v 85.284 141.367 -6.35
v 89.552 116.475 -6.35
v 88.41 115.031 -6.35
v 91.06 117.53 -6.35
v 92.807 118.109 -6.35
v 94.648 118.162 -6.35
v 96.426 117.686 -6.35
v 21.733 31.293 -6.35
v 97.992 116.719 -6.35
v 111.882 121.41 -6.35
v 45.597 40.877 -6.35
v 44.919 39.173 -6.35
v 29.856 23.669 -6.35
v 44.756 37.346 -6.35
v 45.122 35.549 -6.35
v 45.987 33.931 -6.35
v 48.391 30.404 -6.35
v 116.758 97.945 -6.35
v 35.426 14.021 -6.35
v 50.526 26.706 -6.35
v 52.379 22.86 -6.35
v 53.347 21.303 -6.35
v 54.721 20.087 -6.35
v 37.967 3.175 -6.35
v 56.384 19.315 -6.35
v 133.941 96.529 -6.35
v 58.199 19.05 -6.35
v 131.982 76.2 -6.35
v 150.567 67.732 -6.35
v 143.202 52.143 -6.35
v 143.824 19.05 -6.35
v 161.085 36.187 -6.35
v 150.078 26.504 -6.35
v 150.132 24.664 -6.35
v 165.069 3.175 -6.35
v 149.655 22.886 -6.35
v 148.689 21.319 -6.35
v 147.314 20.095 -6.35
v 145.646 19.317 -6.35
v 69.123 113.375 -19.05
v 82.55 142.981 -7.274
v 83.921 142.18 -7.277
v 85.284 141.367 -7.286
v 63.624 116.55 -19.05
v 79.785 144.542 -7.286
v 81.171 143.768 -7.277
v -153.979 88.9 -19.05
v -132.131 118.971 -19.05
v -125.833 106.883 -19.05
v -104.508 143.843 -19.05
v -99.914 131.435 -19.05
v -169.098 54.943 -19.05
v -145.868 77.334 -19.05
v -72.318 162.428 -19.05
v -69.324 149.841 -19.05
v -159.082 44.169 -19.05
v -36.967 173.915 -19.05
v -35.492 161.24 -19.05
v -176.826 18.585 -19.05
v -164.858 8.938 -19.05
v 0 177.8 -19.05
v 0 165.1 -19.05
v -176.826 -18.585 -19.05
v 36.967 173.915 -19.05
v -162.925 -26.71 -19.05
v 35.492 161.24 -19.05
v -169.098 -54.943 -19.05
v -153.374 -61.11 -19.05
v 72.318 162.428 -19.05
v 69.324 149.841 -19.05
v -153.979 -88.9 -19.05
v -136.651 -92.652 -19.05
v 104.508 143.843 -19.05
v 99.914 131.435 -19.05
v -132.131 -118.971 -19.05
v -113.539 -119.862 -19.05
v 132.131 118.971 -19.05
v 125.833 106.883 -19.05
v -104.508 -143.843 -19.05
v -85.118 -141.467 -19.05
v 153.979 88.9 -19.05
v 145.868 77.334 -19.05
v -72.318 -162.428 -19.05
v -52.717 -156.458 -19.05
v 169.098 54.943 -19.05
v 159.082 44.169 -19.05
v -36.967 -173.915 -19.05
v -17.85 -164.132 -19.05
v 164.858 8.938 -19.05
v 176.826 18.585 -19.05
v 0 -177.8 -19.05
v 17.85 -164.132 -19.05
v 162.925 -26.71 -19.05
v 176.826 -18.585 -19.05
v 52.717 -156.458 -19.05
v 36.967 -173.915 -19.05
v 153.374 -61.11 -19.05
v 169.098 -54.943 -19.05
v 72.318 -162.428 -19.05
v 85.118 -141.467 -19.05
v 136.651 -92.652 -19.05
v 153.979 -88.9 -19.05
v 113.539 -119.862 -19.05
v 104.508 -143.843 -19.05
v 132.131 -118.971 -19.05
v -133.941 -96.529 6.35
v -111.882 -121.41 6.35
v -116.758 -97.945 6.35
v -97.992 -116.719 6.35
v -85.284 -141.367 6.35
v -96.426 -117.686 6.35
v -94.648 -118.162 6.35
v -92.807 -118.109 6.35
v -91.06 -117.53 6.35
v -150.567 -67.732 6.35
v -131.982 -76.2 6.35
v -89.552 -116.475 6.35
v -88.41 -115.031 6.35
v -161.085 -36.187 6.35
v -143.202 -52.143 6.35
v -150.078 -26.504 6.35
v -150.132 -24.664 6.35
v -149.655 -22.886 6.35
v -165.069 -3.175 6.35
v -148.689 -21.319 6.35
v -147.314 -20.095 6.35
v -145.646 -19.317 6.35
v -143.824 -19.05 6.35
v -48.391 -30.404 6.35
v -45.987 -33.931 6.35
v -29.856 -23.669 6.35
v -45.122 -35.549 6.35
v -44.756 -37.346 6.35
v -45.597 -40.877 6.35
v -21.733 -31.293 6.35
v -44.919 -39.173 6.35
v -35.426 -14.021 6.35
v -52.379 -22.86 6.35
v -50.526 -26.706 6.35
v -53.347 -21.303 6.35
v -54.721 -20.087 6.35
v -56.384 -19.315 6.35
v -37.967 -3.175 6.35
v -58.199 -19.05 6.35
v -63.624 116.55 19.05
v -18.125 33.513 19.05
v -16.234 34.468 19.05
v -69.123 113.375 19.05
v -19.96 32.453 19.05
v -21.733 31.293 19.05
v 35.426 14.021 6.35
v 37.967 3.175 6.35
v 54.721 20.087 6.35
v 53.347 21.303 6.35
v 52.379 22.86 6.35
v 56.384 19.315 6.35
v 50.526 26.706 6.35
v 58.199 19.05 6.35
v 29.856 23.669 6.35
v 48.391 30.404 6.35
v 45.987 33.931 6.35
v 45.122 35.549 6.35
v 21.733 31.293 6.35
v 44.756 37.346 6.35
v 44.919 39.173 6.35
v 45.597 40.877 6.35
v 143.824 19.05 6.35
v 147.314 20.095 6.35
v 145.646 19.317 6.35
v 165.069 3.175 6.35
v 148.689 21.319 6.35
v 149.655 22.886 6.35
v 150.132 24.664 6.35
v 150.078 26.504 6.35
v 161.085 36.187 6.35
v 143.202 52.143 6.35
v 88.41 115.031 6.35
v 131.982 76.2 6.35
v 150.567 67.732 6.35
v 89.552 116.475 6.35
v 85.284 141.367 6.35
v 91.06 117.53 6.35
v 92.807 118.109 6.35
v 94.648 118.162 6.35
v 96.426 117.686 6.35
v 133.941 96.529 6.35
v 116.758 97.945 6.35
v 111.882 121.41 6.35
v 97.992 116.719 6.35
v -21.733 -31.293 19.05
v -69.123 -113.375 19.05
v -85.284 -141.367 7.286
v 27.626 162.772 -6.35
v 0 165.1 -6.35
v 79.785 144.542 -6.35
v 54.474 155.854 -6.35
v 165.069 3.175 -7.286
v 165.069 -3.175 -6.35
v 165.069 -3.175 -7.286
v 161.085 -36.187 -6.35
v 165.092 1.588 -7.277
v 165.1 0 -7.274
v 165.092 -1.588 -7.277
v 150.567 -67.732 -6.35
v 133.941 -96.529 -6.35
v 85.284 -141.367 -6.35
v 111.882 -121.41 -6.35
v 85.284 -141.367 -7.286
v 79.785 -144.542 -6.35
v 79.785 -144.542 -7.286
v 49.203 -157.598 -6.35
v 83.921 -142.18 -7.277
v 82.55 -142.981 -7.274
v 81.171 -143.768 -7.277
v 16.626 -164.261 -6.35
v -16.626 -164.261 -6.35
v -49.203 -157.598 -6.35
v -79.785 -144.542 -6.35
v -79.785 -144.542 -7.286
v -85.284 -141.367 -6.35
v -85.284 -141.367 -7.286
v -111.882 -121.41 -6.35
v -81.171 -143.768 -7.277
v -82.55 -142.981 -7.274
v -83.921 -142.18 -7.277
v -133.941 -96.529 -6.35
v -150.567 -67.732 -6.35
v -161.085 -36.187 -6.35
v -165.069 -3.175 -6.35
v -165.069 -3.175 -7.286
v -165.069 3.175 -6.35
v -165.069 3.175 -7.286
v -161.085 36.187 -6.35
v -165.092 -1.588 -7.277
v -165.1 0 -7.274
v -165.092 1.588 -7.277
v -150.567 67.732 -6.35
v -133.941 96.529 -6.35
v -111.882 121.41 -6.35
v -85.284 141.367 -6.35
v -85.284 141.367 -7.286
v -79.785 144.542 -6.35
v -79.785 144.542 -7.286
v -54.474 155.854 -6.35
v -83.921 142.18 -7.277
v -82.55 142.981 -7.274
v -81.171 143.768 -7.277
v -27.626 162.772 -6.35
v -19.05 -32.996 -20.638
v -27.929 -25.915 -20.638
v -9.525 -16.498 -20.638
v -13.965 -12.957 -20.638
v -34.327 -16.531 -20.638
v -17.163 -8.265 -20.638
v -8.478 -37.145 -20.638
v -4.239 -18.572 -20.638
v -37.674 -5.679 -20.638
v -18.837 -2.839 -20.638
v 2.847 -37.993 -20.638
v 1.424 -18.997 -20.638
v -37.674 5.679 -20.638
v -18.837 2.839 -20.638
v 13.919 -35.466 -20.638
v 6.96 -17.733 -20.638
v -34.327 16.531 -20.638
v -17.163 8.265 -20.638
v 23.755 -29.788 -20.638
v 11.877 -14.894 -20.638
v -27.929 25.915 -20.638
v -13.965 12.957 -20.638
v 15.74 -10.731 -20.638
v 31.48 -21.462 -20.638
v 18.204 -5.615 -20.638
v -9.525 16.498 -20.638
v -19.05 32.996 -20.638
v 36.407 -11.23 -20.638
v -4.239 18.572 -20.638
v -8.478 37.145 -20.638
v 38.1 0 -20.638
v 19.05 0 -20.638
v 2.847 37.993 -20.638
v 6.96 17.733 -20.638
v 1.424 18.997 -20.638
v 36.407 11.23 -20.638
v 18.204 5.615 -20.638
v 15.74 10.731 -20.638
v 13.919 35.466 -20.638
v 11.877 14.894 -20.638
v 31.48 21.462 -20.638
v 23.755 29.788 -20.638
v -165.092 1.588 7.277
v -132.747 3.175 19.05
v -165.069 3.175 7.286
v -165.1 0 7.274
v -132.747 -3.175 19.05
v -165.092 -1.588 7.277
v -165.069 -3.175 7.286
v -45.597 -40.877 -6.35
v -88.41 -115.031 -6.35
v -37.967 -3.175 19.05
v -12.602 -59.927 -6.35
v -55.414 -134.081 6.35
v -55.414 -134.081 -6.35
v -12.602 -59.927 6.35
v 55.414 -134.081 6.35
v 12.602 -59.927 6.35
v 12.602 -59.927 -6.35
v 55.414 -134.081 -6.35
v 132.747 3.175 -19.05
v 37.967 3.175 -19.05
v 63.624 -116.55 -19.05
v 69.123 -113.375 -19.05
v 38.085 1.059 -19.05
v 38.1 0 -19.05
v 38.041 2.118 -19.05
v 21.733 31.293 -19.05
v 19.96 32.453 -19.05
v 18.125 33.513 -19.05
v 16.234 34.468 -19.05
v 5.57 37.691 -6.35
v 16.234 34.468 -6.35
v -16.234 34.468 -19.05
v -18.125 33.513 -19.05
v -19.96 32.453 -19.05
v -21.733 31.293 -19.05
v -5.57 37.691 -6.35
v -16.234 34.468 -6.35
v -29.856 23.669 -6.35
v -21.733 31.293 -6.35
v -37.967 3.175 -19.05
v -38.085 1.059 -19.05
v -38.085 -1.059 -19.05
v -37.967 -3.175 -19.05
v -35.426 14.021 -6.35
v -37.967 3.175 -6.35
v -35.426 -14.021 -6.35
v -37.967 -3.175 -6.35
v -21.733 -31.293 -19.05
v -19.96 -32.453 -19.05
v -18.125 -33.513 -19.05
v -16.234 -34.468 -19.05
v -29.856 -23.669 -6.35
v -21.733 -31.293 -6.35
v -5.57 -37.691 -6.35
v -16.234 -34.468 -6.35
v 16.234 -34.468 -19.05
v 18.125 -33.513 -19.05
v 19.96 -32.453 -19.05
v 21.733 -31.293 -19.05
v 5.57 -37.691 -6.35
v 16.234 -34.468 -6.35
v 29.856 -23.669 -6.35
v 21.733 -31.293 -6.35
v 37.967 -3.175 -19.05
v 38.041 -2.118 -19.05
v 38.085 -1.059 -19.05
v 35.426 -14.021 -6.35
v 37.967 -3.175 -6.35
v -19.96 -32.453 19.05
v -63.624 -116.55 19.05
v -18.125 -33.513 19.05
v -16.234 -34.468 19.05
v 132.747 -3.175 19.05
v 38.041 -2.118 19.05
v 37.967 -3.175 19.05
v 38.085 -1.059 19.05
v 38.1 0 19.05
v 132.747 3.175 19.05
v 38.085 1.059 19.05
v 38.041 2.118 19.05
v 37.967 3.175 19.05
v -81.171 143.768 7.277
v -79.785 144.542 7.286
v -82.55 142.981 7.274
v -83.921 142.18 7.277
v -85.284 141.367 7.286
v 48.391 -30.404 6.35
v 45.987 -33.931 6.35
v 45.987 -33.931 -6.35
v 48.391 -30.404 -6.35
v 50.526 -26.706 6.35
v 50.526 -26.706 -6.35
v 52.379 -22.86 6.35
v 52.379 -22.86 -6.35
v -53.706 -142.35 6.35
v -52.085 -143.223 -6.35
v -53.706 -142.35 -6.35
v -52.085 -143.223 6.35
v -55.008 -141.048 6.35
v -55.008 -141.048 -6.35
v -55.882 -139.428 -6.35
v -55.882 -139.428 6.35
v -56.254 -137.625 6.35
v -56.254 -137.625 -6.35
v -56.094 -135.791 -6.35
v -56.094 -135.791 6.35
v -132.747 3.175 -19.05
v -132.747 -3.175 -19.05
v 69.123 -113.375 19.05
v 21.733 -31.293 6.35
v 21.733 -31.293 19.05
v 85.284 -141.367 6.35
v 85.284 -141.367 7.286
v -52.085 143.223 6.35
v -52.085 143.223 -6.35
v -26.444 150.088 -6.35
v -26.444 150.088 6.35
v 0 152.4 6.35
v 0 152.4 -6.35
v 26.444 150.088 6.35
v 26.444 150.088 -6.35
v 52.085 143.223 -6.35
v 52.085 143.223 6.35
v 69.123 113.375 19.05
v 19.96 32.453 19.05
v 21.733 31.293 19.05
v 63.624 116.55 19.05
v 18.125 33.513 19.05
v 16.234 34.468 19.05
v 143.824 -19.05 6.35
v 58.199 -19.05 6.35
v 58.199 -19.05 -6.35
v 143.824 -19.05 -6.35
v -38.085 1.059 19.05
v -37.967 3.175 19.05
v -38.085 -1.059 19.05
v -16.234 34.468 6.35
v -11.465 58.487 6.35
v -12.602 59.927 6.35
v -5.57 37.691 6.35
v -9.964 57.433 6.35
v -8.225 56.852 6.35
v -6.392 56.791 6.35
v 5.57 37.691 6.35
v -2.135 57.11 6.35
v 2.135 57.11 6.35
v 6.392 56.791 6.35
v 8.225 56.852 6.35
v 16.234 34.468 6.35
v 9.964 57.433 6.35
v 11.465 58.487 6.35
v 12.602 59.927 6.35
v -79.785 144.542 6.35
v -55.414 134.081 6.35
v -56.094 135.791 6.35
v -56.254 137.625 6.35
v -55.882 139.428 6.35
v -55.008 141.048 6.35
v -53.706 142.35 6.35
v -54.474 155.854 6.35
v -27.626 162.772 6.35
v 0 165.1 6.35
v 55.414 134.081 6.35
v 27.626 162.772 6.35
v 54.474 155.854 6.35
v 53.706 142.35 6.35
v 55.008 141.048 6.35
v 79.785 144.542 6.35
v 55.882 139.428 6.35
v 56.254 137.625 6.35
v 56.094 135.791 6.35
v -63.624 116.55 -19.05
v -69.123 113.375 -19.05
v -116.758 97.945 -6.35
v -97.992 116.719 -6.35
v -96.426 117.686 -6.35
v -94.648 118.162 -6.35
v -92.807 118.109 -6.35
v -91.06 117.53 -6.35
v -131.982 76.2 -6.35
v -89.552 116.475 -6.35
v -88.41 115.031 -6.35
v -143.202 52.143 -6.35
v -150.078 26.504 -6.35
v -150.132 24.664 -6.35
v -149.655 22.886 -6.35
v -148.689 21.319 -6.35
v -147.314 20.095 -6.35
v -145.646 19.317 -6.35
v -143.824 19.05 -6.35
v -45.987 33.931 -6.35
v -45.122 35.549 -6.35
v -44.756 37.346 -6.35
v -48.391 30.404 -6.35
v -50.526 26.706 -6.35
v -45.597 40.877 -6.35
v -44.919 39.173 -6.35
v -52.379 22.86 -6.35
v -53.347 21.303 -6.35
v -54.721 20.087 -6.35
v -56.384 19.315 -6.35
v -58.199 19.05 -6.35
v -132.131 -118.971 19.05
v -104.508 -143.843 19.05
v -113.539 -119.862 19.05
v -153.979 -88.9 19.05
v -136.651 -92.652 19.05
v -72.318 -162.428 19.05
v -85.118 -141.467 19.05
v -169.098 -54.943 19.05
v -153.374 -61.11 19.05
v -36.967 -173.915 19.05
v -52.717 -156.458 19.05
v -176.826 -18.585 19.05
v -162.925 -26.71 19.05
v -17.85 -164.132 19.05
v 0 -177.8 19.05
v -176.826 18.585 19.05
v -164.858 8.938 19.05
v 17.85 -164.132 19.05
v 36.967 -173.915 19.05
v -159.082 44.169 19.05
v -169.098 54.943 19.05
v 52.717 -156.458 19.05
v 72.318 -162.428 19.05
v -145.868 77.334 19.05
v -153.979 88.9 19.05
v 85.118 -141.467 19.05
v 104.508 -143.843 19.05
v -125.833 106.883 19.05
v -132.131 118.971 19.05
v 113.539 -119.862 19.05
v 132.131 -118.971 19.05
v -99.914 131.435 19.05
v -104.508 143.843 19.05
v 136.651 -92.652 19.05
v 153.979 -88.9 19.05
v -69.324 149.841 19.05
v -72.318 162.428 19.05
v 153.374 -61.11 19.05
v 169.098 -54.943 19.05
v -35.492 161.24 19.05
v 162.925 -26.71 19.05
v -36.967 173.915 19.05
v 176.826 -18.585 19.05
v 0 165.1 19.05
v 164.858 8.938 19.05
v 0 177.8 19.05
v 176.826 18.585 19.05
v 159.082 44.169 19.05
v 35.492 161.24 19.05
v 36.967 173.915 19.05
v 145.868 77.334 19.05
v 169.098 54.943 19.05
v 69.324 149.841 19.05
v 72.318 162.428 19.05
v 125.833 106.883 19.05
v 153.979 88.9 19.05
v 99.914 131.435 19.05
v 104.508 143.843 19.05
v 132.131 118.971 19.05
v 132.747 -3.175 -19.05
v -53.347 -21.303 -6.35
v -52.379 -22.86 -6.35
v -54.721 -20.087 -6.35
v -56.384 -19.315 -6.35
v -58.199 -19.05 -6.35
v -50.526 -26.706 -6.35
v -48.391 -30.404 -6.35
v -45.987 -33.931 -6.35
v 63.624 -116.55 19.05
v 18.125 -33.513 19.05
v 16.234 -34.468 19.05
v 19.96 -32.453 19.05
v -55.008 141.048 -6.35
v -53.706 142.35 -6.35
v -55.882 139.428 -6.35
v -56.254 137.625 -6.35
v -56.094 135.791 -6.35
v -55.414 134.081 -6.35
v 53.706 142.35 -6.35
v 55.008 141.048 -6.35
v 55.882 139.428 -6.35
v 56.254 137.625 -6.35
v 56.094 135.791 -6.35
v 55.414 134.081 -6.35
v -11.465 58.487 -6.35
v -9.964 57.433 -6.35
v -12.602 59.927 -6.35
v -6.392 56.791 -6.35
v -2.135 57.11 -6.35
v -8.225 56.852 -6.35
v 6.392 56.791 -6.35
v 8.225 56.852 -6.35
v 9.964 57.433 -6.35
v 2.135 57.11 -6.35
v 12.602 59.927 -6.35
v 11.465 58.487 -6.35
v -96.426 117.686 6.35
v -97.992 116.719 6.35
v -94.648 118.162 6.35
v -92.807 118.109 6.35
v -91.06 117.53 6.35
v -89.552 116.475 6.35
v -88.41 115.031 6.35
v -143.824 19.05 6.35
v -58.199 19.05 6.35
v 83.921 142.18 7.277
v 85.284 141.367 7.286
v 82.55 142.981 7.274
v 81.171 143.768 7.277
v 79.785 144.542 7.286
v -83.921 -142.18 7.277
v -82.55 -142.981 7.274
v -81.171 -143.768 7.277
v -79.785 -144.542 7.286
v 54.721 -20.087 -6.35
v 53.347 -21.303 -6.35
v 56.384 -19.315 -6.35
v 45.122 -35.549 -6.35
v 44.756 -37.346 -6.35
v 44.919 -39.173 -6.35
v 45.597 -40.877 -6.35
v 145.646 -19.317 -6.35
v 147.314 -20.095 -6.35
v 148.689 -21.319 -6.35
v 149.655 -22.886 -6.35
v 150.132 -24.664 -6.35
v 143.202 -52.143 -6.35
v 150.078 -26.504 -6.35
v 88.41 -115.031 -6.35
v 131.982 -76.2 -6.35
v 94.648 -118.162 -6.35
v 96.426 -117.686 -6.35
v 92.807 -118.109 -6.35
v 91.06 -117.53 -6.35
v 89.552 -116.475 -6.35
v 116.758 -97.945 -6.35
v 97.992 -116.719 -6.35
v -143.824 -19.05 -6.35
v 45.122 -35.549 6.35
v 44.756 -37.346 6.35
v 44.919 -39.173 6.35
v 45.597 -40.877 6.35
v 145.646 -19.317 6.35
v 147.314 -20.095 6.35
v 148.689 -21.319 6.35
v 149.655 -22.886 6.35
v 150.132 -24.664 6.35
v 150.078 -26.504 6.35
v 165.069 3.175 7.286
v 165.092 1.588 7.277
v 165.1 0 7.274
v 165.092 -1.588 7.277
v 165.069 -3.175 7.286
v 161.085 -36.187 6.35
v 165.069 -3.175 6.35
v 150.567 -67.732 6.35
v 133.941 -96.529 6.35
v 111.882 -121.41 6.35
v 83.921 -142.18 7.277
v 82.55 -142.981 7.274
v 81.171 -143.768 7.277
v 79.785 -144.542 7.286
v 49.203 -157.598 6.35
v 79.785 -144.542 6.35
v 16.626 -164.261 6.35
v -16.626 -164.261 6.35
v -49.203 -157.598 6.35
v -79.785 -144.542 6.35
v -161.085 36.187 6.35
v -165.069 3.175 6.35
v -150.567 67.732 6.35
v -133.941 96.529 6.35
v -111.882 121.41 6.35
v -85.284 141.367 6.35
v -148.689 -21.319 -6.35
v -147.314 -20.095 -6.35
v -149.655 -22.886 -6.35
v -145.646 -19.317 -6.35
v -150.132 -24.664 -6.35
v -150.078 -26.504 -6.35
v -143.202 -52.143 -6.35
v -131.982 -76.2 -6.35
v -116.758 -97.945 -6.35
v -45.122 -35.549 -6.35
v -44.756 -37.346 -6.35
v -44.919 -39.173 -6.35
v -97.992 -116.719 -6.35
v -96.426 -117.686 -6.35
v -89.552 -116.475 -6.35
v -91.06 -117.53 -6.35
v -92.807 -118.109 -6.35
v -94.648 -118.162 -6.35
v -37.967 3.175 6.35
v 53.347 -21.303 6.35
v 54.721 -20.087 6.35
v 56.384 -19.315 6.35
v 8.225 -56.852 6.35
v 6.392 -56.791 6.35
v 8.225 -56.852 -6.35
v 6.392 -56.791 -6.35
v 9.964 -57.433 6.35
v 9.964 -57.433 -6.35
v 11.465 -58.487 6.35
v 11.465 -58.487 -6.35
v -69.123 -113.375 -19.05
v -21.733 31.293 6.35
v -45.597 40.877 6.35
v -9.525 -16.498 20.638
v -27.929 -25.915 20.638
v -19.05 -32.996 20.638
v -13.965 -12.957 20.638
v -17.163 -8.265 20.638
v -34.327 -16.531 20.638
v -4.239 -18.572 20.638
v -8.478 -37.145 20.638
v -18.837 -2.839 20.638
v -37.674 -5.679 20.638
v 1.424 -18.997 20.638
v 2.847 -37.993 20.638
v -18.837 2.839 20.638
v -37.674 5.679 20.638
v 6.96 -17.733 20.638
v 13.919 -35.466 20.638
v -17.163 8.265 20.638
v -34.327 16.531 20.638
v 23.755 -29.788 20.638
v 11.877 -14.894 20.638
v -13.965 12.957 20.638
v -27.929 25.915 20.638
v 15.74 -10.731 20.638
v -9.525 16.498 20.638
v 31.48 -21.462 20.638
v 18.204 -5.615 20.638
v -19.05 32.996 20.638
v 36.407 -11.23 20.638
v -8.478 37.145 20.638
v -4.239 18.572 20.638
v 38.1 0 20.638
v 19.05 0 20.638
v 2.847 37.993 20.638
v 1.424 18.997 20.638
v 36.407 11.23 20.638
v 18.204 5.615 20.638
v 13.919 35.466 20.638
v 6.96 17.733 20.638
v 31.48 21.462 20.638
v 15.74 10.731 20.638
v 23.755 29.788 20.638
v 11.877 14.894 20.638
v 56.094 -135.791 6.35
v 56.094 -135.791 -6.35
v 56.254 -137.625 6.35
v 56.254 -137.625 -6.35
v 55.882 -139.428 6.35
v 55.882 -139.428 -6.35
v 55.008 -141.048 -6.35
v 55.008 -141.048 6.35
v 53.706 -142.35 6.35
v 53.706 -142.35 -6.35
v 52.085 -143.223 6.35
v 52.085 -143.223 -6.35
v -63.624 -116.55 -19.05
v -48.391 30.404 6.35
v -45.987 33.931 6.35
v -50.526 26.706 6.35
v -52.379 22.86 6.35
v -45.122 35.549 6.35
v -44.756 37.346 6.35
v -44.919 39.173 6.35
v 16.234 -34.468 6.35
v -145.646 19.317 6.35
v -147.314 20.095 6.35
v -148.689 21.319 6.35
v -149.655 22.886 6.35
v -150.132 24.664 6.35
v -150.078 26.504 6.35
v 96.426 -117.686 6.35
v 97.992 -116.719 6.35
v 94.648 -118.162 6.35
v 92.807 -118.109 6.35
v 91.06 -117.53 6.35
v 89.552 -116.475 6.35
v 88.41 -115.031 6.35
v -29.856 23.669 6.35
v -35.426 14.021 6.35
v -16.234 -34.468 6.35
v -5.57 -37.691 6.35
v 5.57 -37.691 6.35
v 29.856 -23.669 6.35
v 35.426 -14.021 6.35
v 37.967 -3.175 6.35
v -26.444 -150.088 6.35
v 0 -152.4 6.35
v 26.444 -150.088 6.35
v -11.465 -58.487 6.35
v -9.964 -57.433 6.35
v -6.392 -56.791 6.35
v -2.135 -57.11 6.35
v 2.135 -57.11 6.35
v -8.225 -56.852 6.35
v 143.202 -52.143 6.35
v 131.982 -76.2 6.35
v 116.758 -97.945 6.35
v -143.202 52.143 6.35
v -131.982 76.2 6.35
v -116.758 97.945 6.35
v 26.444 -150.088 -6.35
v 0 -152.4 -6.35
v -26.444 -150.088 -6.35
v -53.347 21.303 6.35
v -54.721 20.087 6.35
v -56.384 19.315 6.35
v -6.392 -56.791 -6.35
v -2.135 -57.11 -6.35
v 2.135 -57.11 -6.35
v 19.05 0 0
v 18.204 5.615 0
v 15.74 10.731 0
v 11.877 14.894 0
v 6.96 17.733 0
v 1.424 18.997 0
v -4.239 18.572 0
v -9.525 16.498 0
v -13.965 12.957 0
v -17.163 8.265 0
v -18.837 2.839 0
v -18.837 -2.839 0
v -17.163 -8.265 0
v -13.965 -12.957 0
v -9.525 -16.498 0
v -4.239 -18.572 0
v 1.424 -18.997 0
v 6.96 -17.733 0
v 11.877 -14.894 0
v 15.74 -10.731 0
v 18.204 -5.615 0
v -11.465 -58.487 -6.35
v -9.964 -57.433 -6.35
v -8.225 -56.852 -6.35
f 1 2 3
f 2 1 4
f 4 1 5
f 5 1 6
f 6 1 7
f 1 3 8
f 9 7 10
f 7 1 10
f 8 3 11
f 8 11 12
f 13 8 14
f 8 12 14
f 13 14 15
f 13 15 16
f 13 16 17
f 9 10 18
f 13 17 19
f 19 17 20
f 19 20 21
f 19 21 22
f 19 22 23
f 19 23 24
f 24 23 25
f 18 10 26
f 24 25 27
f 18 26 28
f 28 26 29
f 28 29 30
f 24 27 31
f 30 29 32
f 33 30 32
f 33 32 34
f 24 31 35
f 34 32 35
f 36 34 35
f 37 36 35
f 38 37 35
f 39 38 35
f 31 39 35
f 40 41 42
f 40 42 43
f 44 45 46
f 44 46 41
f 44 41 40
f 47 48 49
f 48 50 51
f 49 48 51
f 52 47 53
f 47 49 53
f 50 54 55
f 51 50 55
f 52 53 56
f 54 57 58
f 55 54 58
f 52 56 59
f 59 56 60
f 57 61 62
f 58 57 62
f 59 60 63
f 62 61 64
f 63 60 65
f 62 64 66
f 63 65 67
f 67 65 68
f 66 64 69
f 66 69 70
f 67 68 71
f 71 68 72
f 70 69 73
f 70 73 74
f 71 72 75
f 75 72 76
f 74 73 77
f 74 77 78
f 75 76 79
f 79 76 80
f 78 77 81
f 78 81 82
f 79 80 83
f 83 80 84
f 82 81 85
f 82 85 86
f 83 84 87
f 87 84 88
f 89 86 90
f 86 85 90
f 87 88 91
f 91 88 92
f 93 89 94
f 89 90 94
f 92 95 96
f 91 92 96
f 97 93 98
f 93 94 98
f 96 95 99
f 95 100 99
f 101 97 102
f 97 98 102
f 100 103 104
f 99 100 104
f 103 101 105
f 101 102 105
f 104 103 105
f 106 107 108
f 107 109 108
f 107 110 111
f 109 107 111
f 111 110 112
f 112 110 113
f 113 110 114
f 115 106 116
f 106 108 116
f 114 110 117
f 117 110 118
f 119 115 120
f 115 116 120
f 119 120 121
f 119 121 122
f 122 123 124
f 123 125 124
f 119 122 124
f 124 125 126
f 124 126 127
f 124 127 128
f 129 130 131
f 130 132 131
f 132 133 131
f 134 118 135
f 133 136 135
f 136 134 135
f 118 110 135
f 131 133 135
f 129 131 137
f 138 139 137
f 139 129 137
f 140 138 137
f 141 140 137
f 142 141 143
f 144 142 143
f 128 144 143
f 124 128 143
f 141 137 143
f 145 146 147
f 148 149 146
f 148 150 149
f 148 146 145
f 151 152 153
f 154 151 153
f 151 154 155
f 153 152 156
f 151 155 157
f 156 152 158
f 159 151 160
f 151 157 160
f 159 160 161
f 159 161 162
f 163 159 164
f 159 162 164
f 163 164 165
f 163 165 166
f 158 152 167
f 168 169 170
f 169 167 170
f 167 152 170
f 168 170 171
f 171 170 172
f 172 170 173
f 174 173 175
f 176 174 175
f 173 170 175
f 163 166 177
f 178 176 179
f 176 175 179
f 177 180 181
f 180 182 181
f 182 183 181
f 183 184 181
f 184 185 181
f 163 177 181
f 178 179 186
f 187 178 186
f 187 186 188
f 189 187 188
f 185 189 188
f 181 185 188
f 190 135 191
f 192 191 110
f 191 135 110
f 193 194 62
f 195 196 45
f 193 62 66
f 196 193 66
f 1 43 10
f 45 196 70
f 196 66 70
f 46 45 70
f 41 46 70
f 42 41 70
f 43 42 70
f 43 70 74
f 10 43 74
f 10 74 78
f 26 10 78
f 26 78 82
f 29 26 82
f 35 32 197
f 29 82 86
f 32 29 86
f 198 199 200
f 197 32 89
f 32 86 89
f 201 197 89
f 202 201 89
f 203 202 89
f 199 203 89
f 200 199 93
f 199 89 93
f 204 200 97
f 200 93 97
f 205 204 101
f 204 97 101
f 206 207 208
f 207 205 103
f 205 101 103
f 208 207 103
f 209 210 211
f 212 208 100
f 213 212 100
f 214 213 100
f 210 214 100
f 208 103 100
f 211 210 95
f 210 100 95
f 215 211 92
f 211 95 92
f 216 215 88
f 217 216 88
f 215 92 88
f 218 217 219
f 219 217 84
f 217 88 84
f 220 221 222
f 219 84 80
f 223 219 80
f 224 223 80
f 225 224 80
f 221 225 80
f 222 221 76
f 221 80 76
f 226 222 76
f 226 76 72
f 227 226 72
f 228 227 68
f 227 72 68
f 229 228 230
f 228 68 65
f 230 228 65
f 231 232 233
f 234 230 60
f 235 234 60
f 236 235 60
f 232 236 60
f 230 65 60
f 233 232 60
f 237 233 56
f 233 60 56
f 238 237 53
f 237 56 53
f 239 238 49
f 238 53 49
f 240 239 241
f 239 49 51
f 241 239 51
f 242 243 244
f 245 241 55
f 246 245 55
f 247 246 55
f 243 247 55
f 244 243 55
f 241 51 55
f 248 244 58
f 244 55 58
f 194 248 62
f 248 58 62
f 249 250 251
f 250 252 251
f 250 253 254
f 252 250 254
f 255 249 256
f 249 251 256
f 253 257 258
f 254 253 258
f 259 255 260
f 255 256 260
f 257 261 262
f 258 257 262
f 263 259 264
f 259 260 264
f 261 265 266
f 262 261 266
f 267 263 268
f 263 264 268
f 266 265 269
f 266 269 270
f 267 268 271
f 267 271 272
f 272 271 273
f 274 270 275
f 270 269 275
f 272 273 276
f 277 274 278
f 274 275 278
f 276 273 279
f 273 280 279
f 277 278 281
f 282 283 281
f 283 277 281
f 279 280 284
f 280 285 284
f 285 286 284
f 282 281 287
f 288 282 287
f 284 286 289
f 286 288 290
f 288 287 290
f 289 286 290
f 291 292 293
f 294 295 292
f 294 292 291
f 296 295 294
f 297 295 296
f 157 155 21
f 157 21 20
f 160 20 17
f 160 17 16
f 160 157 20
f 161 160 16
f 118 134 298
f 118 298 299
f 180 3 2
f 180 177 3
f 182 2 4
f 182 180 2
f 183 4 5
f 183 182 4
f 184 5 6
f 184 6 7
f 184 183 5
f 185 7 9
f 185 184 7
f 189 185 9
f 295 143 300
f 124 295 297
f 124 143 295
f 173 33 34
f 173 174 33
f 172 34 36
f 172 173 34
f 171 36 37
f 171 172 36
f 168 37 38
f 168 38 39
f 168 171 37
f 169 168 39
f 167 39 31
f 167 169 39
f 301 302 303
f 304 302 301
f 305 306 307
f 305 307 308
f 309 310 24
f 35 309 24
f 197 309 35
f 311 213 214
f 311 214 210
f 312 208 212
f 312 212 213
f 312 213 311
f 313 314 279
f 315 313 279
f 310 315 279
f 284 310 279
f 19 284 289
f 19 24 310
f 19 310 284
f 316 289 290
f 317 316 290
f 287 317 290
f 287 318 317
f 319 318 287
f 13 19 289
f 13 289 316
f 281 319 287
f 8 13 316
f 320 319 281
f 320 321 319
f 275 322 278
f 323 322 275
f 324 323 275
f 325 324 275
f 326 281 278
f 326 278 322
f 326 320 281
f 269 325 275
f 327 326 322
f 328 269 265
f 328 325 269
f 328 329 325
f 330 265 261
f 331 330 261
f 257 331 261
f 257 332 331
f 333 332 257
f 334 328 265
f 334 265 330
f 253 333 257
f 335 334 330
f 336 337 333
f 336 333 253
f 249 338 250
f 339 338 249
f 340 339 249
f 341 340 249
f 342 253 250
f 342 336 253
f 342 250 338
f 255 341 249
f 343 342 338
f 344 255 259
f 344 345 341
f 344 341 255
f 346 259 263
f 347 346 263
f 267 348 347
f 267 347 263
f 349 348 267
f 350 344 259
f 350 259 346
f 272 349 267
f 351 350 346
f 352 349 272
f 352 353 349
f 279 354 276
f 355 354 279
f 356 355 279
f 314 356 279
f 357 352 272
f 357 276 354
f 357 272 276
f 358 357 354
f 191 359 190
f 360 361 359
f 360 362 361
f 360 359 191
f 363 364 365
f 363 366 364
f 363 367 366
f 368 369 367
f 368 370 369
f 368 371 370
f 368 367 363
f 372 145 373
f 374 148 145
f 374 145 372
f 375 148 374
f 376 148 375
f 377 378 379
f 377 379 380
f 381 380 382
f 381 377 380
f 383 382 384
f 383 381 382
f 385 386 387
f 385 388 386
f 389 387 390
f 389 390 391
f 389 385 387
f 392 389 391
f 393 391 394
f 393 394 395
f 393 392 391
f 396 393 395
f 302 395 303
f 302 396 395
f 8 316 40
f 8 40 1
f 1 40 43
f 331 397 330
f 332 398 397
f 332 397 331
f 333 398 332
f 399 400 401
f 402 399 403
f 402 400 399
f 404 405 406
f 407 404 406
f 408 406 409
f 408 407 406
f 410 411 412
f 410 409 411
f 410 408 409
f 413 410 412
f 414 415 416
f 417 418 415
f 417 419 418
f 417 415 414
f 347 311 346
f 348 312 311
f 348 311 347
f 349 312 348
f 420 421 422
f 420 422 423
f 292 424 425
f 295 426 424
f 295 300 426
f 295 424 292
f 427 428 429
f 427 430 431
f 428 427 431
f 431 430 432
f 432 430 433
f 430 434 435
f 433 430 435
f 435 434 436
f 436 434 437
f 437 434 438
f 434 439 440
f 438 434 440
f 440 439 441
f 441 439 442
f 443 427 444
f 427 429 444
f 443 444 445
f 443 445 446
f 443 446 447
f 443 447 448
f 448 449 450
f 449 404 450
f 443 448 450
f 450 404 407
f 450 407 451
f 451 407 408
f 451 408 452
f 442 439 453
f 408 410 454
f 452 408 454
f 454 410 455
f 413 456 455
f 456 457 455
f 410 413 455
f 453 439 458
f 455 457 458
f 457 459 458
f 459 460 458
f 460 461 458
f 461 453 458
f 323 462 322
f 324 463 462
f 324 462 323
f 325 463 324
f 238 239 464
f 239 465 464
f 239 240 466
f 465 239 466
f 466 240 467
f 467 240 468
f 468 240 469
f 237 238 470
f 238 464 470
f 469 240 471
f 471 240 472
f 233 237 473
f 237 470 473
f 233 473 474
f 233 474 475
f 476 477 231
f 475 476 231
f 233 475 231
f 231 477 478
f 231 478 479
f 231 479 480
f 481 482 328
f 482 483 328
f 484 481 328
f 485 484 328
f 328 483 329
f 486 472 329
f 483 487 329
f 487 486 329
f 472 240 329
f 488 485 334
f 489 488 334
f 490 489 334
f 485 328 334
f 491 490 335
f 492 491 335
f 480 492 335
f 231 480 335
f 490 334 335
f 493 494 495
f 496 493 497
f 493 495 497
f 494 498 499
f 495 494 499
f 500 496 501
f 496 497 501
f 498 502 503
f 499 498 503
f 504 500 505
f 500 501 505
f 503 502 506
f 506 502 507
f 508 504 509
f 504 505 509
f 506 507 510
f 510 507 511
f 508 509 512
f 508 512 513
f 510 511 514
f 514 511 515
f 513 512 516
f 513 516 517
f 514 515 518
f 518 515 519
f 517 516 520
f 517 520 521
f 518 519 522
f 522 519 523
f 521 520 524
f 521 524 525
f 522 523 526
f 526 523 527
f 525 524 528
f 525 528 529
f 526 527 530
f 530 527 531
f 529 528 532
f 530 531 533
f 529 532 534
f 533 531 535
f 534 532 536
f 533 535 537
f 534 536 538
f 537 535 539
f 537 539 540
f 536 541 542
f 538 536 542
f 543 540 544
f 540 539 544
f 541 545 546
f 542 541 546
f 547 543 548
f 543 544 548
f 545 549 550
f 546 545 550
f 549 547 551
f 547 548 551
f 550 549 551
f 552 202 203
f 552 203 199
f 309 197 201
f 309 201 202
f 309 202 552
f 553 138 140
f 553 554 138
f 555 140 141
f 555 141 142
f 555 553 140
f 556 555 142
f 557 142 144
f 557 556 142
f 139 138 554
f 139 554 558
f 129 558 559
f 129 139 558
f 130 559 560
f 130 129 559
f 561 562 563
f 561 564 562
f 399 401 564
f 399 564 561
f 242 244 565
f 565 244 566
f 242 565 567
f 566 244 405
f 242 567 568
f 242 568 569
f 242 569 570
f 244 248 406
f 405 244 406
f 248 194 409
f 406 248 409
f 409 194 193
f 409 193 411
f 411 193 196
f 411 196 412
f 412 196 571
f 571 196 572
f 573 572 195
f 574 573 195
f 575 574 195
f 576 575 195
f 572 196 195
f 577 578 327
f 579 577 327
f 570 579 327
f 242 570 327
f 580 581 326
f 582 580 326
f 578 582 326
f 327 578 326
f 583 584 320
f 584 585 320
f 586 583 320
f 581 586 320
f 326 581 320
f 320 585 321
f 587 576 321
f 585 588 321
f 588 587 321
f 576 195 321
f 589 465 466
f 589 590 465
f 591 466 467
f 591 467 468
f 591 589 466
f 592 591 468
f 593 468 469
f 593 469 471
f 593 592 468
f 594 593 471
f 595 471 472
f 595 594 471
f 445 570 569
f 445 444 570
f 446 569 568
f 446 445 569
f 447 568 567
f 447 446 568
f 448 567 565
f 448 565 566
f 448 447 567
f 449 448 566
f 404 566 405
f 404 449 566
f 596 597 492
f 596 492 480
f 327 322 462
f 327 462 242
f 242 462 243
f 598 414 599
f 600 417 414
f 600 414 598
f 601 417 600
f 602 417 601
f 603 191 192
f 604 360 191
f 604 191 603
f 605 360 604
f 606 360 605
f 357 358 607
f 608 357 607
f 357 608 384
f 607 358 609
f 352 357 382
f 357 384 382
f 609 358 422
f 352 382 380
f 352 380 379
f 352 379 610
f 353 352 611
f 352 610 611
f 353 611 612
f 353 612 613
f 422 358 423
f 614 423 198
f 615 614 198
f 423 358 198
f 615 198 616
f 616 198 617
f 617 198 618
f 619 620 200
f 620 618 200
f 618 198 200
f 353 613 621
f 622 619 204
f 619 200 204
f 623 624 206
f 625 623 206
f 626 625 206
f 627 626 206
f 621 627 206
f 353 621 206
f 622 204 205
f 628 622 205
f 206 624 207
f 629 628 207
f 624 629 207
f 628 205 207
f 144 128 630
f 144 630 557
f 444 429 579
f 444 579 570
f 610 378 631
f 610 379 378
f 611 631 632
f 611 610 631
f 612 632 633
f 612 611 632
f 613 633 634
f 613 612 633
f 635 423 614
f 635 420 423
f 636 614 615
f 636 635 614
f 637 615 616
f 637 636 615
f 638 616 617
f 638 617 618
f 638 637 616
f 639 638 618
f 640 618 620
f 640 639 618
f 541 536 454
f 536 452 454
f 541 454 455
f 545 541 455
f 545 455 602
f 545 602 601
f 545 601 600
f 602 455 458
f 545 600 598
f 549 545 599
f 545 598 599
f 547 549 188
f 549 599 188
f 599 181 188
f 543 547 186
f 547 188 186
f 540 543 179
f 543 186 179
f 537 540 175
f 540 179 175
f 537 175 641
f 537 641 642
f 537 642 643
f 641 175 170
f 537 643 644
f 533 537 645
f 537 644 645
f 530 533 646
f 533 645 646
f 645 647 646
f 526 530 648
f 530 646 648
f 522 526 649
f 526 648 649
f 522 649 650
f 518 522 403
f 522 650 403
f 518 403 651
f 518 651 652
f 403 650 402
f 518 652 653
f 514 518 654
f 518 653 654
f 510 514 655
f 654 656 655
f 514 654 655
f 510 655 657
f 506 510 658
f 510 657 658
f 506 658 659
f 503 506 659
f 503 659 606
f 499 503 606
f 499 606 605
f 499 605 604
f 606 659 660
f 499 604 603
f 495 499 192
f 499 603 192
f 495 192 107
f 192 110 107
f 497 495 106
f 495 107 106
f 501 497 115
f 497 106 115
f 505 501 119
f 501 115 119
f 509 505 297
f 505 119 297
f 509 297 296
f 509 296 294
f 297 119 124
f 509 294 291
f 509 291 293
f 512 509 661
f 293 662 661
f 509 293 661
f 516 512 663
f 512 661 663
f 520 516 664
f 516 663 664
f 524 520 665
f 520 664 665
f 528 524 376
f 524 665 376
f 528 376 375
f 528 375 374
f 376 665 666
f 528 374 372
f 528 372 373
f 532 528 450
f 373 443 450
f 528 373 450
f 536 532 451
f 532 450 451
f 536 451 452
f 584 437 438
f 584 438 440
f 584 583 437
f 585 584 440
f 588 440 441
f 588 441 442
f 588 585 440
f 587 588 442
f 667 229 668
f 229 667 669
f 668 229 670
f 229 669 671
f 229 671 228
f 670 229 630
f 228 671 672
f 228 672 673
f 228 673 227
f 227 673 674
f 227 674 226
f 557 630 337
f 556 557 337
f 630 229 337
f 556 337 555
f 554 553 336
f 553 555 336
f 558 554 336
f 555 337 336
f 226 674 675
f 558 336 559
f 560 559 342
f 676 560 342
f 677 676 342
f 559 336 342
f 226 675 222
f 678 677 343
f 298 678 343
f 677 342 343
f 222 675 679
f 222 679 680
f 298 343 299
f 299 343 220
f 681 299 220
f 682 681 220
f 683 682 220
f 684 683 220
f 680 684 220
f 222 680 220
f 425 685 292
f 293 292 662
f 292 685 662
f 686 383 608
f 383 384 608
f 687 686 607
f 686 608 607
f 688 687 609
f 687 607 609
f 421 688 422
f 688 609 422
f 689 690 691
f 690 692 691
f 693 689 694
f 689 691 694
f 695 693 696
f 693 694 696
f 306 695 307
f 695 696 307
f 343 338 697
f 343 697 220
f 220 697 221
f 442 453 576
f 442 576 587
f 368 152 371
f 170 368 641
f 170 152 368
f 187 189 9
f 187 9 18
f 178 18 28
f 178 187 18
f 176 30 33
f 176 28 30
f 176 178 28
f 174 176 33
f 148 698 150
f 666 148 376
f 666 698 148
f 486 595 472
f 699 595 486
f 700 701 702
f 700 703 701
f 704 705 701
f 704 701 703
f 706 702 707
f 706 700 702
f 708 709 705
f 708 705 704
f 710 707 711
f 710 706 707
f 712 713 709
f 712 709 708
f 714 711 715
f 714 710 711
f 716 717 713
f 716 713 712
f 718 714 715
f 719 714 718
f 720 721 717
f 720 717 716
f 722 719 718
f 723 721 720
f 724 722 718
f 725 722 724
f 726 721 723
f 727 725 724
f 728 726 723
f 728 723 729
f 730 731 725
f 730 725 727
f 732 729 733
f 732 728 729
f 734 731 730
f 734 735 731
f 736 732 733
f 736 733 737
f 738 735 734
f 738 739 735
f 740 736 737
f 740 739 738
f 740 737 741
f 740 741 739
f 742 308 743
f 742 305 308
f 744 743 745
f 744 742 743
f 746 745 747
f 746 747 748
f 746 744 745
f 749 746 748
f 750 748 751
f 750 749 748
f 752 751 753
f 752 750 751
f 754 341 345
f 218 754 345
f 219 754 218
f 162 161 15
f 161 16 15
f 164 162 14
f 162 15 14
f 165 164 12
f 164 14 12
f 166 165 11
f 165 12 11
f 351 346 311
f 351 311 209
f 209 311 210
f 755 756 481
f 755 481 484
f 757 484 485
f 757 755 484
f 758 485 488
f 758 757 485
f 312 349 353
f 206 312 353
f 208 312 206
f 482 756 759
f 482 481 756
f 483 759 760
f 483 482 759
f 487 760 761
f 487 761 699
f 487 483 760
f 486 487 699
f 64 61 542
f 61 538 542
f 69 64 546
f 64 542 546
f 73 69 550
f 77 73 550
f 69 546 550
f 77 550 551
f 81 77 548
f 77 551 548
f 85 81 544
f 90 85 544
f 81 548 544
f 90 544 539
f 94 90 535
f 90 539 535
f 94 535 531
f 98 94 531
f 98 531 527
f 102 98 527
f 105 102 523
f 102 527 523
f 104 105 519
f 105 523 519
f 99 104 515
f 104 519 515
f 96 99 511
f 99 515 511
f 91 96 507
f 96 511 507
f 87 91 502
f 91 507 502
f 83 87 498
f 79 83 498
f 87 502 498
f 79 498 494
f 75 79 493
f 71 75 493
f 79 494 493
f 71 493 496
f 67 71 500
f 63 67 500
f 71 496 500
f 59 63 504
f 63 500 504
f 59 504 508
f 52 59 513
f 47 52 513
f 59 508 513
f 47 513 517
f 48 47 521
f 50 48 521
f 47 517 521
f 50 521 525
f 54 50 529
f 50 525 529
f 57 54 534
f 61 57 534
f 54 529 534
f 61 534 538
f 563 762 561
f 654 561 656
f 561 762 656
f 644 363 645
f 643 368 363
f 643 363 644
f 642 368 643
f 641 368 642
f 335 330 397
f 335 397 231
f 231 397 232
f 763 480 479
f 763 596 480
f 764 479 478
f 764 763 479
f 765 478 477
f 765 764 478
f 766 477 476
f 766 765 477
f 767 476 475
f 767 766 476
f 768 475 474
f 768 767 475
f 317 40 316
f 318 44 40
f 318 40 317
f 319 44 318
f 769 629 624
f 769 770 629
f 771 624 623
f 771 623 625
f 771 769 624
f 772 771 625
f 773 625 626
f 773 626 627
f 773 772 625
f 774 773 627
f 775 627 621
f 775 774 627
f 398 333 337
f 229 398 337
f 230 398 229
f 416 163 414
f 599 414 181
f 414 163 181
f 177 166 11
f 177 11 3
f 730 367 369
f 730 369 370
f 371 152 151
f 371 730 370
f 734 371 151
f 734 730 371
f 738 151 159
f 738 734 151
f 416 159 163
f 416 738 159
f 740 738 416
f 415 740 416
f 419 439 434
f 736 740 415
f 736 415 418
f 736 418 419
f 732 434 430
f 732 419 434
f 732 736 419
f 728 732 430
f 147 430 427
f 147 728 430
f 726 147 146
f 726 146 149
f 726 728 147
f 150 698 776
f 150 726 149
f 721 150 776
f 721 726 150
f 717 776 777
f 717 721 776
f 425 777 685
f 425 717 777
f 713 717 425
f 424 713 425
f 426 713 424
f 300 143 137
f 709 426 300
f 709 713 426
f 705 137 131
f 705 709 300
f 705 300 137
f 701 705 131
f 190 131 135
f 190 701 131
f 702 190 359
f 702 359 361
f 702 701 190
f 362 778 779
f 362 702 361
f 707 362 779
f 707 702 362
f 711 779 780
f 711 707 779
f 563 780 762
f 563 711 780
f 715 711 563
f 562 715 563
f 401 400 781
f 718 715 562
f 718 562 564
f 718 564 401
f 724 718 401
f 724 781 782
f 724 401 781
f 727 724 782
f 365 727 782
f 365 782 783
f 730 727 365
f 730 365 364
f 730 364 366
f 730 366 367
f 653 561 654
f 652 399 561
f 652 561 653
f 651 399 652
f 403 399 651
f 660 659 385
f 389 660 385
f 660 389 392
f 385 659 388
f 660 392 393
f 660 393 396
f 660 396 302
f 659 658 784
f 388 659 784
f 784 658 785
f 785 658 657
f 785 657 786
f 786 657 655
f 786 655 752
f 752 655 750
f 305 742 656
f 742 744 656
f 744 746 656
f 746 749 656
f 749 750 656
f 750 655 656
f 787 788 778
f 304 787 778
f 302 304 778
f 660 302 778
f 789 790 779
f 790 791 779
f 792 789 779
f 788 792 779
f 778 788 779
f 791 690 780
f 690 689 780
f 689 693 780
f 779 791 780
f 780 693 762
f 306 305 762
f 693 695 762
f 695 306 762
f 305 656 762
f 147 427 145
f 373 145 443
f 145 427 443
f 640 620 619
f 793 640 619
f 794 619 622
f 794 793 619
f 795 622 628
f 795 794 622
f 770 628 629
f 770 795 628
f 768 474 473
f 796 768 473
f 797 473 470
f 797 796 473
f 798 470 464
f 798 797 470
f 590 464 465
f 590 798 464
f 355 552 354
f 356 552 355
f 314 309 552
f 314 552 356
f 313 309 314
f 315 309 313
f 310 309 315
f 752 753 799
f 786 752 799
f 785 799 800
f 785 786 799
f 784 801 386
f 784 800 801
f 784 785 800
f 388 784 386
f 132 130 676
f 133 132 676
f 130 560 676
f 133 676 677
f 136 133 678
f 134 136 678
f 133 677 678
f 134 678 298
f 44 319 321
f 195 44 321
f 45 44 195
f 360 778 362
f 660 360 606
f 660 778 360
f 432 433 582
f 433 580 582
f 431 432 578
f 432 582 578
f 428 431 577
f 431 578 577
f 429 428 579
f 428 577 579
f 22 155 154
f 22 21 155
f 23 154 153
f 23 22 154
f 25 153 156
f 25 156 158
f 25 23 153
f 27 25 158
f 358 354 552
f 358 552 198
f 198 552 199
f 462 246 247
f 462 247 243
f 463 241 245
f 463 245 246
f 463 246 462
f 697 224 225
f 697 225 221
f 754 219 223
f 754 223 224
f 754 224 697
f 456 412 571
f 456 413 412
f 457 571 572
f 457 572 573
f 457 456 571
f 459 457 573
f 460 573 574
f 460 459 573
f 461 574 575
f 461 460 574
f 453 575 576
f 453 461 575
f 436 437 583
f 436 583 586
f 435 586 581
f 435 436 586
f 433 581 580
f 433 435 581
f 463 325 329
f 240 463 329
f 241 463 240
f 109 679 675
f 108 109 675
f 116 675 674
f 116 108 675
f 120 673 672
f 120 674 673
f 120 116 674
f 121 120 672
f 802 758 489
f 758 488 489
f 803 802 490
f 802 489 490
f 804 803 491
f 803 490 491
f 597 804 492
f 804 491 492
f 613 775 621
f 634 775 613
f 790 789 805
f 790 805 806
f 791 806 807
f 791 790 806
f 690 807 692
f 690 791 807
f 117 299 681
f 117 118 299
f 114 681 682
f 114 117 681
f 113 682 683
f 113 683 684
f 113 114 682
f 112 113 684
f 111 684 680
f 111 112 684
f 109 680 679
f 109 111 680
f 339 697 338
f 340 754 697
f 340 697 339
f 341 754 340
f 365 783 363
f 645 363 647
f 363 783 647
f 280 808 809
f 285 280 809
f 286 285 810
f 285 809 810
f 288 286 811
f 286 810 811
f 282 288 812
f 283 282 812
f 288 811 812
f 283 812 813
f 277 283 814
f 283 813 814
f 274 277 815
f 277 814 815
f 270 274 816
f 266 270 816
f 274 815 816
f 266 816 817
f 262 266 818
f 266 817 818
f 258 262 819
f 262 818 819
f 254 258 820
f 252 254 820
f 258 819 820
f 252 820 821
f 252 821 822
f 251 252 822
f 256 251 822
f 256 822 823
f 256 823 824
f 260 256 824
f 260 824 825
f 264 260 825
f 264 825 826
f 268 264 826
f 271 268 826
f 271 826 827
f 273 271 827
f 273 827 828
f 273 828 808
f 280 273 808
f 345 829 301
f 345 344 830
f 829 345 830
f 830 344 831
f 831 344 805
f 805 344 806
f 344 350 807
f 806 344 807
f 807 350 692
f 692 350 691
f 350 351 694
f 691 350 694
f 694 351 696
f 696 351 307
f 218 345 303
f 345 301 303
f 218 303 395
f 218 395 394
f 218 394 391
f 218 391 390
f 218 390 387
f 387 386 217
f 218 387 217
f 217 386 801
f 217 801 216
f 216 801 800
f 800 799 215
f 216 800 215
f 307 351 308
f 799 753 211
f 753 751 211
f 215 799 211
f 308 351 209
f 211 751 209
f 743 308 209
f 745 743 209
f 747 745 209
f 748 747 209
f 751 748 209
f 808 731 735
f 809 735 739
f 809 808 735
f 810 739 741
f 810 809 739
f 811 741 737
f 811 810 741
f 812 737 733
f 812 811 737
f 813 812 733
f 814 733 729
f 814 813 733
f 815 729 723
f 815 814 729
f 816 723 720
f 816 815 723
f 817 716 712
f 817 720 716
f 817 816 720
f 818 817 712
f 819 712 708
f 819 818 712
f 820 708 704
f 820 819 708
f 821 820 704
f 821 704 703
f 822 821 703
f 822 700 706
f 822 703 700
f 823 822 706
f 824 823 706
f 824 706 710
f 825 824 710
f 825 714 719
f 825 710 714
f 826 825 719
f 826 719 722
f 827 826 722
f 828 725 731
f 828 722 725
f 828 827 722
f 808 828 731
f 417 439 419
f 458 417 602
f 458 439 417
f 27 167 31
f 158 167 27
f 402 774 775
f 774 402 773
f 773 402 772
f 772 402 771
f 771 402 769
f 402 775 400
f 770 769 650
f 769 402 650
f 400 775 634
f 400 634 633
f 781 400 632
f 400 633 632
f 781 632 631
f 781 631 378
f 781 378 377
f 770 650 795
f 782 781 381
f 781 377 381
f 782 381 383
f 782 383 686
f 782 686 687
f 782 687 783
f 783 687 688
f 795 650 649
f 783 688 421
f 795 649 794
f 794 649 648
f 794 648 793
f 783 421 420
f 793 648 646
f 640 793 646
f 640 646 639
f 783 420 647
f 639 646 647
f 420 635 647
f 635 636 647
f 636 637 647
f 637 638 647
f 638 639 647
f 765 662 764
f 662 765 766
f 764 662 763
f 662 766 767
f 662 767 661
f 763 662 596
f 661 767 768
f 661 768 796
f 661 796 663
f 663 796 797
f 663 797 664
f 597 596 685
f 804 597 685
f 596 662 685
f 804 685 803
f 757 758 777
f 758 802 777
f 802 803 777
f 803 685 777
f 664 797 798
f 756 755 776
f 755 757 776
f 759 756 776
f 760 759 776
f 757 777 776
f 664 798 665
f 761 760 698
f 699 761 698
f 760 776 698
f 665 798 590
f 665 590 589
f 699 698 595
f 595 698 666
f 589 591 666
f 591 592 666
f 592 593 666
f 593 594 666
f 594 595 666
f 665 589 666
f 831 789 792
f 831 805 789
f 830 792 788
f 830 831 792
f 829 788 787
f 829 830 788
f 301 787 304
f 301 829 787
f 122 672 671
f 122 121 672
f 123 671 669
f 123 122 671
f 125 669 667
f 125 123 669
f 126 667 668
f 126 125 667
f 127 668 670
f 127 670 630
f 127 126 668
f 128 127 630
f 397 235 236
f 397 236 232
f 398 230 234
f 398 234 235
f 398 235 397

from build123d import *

# Parameters (mm, degrees)
SKETCH1_R                = 38.1
CENTERHUB_DEPTH          = 20.6375
RIB_DEPTH                = 3.175
LIGHTENING_HOLE_DEPTH    = 21.6375
FILLET1_R                = 6.35
CIRPATTERN1_COUNT        = 6
FILLET1_OF_CIRPATTERN1_R = 6.35
SKETCH5_R                = 19.05
THRU_HOLE_DEPTH          = 21.6375
THRU_HOLE_DEPTH_BACK     = 21.6375


with BuildPart() as part:
    # Sketch1 → CenterHub (new body, symmetric)
    with BuildSketch(Plane.XY):
        Circle(SKETCH1_R)
    extrude(amount=CENTERHUB_DEPTH, both=True)

    # Sketch2 → Rim and Web (revolve)
    with BuildSketch(Plane(origin=(0, 0, 0), x_dir=(0, 0, -1), z_dir=(1, 0, 0))):
        Polygon((-6.35, 0), (6.35, 0), (6.35, 165.1), (19.05, 165.1), (19.05, 177.8), (-19.05, 177.8), (-19.05, 165.1), (-6.35, 165.1), align=None)
    revolve(axis=Axis((0, 0, 0), (0, 0, -1)))

    # Sketch3 → Rib (add, symmetric)
    with BuildSketch(Plane(origin=(0, 0, 0), x_dir=(1, 0, 0), z_dir=(0, 1, 0))):
        Polygon((0, -19.05), (132.747036773, -19.05), (167.64, -6.35), (167.64, 6.35), (132.747036773, 19.05), (0, 19.05), align=None)
    rib = extrude(amount=RIB_DEPTH, both=True)

    # Sketch4 → Lightening hole (cut, symmetric)
    with BuildSketch(Plane.XY):
        with BuildLine():
            Line((92.100127656, -121.422100483), (43.438552305, -37.1377796))
            ThreePointArc((43.438552305, -37.1377796), (49.493351826, -28.575), (53.881536726, -19.05))
            Line((53.881536726, -19.05), (151.204687427, -19.05))
            ThreePointArc((151.204687427, -19.05), (131.982271537, -76.2), (92.100127656, -121.422100483))
        make_face()
    lightening_hole = extrude(amount=LIGHTENING_HOLE_DEPTH, both=True, mode=Mode.SUBTRACT)

    # Fillet1
    fillet1_edges = [part.edges().sort_by_distance(p)[0] for p in [
        (151.204687427, -19.05, 0),
        (92.100127656, -121.422100483, 0),
        (43.438552305, -37.1377796, 0),
        (53.881536726, -19.05, 0),
    ]]
    fillet(fillet1_edges, radius=FILLET1_R)

    # CirPattern1: Rib, Lightening hole ×6 about axis
    cirpattern1_axis = Axis((0, 0, 0), (0, 0, 1))
    for i in range(1, CIRPATTERN1_COUNT):
        add(rib.rotate(cirpattern1_axis, i * 360 / CIRPATTERN1_COUNT))
        add(lightening_hole.rotate(cirpattern1_axis, i * 360 / CIRPATTERN1_COUNT), mode=Mode.SUBTRACT)

    # Fillet1 of CirPattern1
    fillet1_of_cirpattern1_edges = [part.edges().sort_by_distance(p)[0] for p in [
        (92.100127656, 121.422100483, 0),
        (151.204687427, 19.05, 0),
        (53.881536726, 19.05, 0),
        (43.438552305, 37.1377796, 0),
        (-59.104559772, 140.472100483, 0),
        (59.104559772, 140.472100483, 0),
        (10.442984421, 56.1877796, 0),
        (-10.442984421, 56.1877796, 0),
        (-151.204687427, 19.05, 0),
        (-92.100127656, 121.422100483, 0),
        (-43.438552305, 37.1377796, 0),
        (-53.881536726, 19.05, 0),
        (-92.100127656, -121.422100483, 0),
        (-151.204687427, -19.05, 0),
        (-53.881536726, -19.05, 0),
        (-43.438552305, -37.1377796, 0),
        (59.104559772, -140.472100483, 0),
        (-59.104559772, -140.472100483, 0),
        (-10.442984421, -56.1877796, 0),
        (10.442984421, -56.1877796, 0),
    ]]
    fillet(fillet1_of_cirpattern1_edges, radius=FILLET1_OF_CIRPATTERN1_R)

    # Sketch5 → Thru hole (cut, two sides)
    with BuildSketch(Plane.XY) as thru_hole_sk:
        Circle(SKETCH5_R)
    extrude(amount=THRU_HOLE_DEPTH, mode=Mode.SUBTRACT)
    extrude(thru_hole_sk.sketch, amount=-THRU_HOLE_DEPTH_BACK, mode=Mode.SUBTRACT)


solid = part.part
